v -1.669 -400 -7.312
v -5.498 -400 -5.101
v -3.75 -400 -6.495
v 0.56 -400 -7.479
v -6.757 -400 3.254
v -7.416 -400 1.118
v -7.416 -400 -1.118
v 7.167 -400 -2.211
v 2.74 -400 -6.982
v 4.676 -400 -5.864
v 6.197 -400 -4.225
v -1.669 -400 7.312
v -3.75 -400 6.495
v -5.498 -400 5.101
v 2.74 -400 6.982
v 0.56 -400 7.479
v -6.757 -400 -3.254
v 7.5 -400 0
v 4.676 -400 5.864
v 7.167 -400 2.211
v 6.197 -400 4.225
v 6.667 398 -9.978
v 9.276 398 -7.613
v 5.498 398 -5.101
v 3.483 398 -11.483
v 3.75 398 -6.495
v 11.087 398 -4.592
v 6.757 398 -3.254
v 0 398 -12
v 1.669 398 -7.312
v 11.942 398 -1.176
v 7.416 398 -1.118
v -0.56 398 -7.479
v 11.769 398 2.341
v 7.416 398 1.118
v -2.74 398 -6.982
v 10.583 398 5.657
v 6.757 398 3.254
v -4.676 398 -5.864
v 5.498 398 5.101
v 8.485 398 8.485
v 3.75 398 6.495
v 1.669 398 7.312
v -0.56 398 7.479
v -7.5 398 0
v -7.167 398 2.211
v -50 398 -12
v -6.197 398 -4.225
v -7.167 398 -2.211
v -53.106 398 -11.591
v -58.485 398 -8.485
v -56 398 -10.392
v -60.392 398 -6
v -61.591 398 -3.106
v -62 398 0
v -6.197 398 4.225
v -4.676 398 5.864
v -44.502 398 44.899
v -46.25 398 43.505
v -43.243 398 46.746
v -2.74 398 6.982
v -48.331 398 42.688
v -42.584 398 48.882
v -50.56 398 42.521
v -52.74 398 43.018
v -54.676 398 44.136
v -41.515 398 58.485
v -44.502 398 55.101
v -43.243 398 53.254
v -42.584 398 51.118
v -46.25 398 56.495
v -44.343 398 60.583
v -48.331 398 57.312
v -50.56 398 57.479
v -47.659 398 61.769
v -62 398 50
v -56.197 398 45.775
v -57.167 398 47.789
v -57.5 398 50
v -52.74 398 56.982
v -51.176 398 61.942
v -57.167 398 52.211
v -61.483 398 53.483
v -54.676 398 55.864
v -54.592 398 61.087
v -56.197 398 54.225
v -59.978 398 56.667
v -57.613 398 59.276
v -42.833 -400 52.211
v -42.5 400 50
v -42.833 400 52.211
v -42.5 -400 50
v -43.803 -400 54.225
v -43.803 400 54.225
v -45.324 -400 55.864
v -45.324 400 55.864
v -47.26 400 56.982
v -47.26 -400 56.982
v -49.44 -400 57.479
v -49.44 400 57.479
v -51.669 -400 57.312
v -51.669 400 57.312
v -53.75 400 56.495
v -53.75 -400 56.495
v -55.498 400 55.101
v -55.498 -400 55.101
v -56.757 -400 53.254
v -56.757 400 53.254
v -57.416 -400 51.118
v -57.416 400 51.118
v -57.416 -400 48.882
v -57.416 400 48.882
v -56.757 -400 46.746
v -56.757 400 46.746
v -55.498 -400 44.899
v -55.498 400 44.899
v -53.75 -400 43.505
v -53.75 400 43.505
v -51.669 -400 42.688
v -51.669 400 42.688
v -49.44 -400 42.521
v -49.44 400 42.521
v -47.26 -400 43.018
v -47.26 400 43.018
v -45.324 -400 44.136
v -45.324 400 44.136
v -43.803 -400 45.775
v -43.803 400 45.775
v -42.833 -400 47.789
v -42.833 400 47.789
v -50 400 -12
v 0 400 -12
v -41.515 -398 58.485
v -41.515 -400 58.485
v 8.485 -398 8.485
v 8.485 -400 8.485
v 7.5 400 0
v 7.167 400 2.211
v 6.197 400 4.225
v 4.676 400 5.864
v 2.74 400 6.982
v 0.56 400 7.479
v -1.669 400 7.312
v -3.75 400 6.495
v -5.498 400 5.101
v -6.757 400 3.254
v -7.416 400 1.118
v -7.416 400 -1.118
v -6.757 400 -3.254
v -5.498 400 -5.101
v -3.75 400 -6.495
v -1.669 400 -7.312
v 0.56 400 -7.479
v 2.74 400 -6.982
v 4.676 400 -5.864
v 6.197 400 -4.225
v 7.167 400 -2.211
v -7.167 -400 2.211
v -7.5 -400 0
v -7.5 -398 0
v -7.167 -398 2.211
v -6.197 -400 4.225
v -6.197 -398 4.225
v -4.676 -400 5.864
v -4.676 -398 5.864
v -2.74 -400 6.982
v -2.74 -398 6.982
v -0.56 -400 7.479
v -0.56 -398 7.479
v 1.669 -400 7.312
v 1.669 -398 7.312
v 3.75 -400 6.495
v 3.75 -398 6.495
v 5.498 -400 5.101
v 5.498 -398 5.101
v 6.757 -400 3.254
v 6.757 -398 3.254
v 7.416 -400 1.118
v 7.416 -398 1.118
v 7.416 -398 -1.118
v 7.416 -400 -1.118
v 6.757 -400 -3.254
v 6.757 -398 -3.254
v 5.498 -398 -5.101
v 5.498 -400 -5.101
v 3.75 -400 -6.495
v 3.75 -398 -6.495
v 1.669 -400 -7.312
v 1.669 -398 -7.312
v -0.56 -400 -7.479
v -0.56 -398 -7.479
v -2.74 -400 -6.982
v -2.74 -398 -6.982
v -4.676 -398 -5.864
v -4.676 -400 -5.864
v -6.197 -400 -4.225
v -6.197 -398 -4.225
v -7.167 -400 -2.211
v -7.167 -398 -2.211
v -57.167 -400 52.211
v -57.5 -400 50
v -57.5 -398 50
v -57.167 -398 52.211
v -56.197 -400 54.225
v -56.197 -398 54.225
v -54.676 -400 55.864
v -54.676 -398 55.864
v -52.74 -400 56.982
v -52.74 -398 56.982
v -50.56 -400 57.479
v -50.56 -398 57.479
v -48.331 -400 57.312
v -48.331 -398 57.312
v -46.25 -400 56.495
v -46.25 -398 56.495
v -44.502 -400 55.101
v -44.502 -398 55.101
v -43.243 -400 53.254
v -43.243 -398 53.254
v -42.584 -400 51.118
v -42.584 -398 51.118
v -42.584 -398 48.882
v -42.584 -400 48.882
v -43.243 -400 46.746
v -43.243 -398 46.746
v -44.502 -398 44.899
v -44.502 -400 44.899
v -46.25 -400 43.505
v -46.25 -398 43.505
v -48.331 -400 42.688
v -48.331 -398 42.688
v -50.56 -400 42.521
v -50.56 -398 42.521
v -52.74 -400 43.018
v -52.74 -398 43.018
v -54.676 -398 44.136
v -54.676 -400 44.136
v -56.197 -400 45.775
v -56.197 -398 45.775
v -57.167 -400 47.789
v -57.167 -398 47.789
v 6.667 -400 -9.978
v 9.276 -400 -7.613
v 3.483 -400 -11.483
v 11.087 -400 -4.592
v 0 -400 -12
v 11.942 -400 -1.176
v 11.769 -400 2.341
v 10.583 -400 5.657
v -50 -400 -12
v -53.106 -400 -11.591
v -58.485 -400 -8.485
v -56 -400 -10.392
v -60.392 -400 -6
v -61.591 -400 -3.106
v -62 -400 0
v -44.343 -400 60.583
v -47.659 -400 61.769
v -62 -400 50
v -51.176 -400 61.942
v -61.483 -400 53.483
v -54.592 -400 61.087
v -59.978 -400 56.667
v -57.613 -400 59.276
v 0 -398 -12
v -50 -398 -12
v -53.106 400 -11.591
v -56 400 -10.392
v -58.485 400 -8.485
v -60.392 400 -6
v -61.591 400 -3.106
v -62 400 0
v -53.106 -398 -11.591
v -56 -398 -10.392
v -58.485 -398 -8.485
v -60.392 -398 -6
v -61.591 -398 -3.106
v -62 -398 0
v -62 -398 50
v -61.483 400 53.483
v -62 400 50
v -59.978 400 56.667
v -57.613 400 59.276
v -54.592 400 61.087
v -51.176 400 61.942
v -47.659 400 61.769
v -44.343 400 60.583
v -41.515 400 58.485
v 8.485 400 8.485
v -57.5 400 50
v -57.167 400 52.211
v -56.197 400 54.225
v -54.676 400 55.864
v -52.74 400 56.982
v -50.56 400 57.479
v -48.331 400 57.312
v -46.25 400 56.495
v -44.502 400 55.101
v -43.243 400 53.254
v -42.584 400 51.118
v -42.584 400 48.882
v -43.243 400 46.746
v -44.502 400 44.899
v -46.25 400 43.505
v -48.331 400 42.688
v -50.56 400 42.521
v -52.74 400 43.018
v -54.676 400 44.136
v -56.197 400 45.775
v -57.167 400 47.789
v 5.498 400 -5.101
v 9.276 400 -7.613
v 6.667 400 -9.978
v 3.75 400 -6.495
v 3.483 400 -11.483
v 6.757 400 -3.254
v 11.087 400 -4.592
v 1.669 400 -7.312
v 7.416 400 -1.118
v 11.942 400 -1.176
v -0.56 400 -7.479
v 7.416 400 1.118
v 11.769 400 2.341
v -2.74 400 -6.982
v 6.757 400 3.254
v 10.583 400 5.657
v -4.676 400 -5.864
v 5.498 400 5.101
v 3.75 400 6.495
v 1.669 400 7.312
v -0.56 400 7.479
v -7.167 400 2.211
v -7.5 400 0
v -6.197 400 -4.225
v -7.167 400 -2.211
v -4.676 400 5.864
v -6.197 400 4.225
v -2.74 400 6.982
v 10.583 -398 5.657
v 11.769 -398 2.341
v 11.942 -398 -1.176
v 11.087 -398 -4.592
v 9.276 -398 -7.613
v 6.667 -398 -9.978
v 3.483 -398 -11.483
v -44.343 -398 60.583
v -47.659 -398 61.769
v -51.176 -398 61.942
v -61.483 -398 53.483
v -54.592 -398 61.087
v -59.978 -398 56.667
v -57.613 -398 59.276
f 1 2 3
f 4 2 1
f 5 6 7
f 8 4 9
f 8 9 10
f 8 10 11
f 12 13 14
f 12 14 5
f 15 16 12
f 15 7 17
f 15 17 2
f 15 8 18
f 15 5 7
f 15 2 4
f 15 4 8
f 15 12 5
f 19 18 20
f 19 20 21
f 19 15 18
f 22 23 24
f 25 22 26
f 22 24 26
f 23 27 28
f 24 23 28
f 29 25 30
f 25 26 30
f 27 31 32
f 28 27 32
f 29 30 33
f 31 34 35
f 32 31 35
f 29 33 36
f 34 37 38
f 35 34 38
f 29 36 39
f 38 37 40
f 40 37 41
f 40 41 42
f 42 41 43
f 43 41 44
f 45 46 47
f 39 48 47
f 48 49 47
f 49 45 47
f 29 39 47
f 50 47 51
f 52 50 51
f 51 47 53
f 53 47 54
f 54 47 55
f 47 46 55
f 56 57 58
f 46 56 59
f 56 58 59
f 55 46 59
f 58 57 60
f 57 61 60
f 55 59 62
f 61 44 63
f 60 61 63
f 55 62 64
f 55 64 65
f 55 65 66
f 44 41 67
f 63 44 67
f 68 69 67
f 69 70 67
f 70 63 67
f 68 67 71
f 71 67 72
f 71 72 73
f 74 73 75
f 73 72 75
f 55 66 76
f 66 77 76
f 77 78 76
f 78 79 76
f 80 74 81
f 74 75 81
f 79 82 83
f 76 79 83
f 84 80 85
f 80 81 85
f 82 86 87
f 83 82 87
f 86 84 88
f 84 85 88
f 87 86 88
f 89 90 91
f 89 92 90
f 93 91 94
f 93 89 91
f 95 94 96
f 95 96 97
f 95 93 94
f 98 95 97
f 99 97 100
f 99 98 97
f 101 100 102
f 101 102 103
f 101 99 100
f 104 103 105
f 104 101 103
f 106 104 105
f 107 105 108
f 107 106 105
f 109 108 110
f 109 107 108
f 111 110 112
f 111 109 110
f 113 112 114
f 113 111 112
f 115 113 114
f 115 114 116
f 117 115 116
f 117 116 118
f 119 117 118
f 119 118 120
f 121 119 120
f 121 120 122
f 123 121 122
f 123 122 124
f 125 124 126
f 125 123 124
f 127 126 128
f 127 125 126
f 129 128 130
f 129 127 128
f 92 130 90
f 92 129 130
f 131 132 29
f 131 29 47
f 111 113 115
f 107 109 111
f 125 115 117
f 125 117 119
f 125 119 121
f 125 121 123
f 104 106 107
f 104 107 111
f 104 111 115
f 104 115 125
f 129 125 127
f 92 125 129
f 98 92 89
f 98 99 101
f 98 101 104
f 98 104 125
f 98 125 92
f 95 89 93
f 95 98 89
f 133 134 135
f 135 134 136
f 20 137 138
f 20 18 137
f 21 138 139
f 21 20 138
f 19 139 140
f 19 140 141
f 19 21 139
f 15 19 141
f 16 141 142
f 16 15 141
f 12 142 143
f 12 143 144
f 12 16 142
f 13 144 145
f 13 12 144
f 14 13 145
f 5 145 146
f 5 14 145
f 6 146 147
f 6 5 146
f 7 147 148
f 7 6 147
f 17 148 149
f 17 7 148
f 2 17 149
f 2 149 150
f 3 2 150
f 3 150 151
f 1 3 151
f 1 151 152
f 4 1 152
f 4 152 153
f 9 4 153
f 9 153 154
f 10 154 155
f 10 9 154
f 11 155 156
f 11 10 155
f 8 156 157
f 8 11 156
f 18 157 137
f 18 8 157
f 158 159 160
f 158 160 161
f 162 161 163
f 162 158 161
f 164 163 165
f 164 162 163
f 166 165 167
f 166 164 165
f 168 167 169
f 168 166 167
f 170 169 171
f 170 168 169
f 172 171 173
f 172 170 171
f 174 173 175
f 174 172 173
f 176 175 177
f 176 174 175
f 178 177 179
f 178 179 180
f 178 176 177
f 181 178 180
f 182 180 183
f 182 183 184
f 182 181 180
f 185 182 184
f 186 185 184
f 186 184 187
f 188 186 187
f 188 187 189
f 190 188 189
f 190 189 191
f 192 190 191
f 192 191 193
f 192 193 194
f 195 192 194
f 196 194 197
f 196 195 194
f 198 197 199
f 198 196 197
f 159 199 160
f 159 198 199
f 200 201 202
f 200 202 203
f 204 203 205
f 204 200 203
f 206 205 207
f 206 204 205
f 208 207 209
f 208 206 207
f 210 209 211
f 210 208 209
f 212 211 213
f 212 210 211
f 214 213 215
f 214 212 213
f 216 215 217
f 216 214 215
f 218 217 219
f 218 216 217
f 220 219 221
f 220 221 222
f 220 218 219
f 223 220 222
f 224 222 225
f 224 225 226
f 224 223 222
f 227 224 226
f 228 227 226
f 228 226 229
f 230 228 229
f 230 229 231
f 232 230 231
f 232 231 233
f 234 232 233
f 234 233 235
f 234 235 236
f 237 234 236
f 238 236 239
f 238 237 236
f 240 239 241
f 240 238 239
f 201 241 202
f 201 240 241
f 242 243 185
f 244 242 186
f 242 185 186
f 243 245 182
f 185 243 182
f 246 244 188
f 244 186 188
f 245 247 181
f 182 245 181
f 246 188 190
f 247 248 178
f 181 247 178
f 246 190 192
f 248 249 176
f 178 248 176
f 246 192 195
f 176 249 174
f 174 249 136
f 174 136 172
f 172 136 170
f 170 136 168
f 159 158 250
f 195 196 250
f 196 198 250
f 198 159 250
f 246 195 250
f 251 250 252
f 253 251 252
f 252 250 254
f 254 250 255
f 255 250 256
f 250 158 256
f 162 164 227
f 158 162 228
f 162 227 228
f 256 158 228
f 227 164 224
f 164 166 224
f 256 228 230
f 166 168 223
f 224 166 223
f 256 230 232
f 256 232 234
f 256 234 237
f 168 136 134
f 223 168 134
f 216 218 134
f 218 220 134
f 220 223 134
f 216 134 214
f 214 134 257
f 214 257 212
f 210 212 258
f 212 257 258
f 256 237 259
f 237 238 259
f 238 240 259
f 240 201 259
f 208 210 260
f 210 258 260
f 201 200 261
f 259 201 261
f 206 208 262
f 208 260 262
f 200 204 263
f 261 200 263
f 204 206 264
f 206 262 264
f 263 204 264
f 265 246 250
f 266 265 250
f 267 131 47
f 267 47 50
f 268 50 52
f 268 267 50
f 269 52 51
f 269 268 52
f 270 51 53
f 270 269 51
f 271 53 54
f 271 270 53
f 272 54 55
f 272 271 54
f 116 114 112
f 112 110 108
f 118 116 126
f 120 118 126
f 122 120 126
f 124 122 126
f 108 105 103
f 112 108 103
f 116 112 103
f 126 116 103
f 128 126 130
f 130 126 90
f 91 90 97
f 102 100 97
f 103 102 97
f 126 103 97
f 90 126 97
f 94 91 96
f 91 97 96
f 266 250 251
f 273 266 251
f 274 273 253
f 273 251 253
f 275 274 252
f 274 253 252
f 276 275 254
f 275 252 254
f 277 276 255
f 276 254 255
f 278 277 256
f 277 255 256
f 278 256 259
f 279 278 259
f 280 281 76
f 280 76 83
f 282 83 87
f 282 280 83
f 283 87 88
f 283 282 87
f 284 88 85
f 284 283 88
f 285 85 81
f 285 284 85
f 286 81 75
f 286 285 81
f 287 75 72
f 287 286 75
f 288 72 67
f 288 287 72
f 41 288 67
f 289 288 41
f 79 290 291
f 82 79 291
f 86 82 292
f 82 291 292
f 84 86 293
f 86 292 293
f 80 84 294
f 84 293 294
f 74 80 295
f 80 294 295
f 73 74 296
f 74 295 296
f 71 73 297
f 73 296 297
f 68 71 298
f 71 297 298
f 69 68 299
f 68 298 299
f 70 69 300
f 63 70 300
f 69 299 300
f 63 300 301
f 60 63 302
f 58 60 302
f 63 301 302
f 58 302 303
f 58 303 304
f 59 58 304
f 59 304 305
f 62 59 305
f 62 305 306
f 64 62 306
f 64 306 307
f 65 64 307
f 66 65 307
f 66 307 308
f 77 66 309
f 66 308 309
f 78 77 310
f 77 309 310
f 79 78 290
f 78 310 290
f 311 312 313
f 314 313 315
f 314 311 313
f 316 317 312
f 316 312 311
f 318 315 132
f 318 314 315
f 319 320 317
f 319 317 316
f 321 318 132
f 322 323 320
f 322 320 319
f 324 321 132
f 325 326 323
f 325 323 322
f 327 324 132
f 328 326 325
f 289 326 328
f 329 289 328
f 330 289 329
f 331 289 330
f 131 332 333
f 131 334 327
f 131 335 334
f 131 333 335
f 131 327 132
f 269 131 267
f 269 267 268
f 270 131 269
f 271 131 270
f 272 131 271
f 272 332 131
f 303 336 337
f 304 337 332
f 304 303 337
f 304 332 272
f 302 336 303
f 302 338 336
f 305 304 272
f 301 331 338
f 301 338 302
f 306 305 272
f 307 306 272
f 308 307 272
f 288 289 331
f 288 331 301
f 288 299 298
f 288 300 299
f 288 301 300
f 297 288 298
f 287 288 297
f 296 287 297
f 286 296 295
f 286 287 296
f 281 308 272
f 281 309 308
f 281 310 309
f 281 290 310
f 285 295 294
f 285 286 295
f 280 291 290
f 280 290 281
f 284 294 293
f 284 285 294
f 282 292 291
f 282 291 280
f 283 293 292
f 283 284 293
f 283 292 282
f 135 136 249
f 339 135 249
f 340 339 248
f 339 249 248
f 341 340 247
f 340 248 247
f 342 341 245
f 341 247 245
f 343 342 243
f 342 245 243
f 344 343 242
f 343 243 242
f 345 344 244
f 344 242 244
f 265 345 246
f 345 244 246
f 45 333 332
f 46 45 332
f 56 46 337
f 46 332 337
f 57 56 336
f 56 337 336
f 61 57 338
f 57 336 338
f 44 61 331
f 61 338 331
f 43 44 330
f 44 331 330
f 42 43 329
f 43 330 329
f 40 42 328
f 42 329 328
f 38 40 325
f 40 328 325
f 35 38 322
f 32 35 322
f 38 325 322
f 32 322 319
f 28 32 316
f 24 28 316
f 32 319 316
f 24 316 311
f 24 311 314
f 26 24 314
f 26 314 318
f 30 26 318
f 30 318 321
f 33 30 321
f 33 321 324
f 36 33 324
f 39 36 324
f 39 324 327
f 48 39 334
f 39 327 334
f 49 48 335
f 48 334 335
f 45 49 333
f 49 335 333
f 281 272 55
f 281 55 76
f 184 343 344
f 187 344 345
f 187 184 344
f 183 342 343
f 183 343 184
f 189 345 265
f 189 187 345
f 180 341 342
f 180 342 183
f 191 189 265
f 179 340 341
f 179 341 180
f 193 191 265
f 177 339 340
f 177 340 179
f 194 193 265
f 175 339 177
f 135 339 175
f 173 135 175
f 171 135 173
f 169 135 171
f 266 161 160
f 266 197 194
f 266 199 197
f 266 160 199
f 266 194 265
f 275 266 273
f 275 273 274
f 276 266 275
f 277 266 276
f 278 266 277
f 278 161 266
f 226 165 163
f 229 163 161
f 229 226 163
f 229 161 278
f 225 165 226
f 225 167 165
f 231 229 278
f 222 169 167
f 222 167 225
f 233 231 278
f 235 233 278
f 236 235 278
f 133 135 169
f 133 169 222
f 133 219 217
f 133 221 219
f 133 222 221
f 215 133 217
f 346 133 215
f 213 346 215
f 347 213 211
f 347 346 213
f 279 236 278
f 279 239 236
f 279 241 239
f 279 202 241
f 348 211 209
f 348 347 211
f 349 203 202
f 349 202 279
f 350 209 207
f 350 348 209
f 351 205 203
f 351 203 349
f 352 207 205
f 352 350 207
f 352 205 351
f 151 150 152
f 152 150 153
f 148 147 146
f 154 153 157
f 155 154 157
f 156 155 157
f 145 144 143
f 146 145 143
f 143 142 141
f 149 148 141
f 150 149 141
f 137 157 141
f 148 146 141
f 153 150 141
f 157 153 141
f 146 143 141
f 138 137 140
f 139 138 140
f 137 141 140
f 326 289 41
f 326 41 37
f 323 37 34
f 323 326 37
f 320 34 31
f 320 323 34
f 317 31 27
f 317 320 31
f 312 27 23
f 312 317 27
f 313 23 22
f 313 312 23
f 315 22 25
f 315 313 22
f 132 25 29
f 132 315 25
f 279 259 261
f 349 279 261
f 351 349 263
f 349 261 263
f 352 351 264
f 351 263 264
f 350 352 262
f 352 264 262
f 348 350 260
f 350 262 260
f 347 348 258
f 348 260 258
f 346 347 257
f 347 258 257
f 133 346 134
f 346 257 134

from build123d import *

# Parameters (mm, degrees)
F0_R          = 7.5
F1_DEPTH      = 400
F1_DEPTH_BACK = 400
F2_R          = 7.5
F3_DEPTH      = 2


with BuildPart() as f1:
    # F0 (on Front) → F1 (new body, two sides)
    with BuildSketch(Plane.XZ) as f1_sk:
        Circle(F0_R)
        with Locations((-50, 50)):
            Circle(F0_R)
    extrude(amount=F1_DEPTH)
    extrude(f1_sk.sketch, amount=-F1_DEPTH_BACK)


with BuildPart() as f3:
    # F2 (on face) → F3 (new body)
    with BuildSketch(Plane(origin=(0, 400, 0), x_dir=(-1, 0, 0), z_dir=(0, 1, 0))):
        with BuildLine():
            Line((41.514719, 58.485281), (-8.485281, 8.485281))
            ThreePointArc((-8.485281, 8.485281), (-11.086554, -4.592201), (0, -12))
            Line((0, -12), (50, -12))
            ThreePointArc((50, -12), (58.485281, -8.485281), (62, 0))
            Line((62, 0), (62, 50))
            ThreePointArc((62, 50), (54.592201, 61.086554), (41.514719, 58.485281))
        make_face()
        Circle(F2_R, mode=Mode.SUBTRACT)
        with Locations((50, 50)):
            Circle(F2_R, mode=Mode.SUBTRACT)
    extrude(amount=-F3_DEPTH)


with BuildPart() as f4_1:
    # F4: instance of F3
    add(f3.part.mirror(Plane.XZ))


solid = Compound([f1.part, f3.part, f4_1.part])
